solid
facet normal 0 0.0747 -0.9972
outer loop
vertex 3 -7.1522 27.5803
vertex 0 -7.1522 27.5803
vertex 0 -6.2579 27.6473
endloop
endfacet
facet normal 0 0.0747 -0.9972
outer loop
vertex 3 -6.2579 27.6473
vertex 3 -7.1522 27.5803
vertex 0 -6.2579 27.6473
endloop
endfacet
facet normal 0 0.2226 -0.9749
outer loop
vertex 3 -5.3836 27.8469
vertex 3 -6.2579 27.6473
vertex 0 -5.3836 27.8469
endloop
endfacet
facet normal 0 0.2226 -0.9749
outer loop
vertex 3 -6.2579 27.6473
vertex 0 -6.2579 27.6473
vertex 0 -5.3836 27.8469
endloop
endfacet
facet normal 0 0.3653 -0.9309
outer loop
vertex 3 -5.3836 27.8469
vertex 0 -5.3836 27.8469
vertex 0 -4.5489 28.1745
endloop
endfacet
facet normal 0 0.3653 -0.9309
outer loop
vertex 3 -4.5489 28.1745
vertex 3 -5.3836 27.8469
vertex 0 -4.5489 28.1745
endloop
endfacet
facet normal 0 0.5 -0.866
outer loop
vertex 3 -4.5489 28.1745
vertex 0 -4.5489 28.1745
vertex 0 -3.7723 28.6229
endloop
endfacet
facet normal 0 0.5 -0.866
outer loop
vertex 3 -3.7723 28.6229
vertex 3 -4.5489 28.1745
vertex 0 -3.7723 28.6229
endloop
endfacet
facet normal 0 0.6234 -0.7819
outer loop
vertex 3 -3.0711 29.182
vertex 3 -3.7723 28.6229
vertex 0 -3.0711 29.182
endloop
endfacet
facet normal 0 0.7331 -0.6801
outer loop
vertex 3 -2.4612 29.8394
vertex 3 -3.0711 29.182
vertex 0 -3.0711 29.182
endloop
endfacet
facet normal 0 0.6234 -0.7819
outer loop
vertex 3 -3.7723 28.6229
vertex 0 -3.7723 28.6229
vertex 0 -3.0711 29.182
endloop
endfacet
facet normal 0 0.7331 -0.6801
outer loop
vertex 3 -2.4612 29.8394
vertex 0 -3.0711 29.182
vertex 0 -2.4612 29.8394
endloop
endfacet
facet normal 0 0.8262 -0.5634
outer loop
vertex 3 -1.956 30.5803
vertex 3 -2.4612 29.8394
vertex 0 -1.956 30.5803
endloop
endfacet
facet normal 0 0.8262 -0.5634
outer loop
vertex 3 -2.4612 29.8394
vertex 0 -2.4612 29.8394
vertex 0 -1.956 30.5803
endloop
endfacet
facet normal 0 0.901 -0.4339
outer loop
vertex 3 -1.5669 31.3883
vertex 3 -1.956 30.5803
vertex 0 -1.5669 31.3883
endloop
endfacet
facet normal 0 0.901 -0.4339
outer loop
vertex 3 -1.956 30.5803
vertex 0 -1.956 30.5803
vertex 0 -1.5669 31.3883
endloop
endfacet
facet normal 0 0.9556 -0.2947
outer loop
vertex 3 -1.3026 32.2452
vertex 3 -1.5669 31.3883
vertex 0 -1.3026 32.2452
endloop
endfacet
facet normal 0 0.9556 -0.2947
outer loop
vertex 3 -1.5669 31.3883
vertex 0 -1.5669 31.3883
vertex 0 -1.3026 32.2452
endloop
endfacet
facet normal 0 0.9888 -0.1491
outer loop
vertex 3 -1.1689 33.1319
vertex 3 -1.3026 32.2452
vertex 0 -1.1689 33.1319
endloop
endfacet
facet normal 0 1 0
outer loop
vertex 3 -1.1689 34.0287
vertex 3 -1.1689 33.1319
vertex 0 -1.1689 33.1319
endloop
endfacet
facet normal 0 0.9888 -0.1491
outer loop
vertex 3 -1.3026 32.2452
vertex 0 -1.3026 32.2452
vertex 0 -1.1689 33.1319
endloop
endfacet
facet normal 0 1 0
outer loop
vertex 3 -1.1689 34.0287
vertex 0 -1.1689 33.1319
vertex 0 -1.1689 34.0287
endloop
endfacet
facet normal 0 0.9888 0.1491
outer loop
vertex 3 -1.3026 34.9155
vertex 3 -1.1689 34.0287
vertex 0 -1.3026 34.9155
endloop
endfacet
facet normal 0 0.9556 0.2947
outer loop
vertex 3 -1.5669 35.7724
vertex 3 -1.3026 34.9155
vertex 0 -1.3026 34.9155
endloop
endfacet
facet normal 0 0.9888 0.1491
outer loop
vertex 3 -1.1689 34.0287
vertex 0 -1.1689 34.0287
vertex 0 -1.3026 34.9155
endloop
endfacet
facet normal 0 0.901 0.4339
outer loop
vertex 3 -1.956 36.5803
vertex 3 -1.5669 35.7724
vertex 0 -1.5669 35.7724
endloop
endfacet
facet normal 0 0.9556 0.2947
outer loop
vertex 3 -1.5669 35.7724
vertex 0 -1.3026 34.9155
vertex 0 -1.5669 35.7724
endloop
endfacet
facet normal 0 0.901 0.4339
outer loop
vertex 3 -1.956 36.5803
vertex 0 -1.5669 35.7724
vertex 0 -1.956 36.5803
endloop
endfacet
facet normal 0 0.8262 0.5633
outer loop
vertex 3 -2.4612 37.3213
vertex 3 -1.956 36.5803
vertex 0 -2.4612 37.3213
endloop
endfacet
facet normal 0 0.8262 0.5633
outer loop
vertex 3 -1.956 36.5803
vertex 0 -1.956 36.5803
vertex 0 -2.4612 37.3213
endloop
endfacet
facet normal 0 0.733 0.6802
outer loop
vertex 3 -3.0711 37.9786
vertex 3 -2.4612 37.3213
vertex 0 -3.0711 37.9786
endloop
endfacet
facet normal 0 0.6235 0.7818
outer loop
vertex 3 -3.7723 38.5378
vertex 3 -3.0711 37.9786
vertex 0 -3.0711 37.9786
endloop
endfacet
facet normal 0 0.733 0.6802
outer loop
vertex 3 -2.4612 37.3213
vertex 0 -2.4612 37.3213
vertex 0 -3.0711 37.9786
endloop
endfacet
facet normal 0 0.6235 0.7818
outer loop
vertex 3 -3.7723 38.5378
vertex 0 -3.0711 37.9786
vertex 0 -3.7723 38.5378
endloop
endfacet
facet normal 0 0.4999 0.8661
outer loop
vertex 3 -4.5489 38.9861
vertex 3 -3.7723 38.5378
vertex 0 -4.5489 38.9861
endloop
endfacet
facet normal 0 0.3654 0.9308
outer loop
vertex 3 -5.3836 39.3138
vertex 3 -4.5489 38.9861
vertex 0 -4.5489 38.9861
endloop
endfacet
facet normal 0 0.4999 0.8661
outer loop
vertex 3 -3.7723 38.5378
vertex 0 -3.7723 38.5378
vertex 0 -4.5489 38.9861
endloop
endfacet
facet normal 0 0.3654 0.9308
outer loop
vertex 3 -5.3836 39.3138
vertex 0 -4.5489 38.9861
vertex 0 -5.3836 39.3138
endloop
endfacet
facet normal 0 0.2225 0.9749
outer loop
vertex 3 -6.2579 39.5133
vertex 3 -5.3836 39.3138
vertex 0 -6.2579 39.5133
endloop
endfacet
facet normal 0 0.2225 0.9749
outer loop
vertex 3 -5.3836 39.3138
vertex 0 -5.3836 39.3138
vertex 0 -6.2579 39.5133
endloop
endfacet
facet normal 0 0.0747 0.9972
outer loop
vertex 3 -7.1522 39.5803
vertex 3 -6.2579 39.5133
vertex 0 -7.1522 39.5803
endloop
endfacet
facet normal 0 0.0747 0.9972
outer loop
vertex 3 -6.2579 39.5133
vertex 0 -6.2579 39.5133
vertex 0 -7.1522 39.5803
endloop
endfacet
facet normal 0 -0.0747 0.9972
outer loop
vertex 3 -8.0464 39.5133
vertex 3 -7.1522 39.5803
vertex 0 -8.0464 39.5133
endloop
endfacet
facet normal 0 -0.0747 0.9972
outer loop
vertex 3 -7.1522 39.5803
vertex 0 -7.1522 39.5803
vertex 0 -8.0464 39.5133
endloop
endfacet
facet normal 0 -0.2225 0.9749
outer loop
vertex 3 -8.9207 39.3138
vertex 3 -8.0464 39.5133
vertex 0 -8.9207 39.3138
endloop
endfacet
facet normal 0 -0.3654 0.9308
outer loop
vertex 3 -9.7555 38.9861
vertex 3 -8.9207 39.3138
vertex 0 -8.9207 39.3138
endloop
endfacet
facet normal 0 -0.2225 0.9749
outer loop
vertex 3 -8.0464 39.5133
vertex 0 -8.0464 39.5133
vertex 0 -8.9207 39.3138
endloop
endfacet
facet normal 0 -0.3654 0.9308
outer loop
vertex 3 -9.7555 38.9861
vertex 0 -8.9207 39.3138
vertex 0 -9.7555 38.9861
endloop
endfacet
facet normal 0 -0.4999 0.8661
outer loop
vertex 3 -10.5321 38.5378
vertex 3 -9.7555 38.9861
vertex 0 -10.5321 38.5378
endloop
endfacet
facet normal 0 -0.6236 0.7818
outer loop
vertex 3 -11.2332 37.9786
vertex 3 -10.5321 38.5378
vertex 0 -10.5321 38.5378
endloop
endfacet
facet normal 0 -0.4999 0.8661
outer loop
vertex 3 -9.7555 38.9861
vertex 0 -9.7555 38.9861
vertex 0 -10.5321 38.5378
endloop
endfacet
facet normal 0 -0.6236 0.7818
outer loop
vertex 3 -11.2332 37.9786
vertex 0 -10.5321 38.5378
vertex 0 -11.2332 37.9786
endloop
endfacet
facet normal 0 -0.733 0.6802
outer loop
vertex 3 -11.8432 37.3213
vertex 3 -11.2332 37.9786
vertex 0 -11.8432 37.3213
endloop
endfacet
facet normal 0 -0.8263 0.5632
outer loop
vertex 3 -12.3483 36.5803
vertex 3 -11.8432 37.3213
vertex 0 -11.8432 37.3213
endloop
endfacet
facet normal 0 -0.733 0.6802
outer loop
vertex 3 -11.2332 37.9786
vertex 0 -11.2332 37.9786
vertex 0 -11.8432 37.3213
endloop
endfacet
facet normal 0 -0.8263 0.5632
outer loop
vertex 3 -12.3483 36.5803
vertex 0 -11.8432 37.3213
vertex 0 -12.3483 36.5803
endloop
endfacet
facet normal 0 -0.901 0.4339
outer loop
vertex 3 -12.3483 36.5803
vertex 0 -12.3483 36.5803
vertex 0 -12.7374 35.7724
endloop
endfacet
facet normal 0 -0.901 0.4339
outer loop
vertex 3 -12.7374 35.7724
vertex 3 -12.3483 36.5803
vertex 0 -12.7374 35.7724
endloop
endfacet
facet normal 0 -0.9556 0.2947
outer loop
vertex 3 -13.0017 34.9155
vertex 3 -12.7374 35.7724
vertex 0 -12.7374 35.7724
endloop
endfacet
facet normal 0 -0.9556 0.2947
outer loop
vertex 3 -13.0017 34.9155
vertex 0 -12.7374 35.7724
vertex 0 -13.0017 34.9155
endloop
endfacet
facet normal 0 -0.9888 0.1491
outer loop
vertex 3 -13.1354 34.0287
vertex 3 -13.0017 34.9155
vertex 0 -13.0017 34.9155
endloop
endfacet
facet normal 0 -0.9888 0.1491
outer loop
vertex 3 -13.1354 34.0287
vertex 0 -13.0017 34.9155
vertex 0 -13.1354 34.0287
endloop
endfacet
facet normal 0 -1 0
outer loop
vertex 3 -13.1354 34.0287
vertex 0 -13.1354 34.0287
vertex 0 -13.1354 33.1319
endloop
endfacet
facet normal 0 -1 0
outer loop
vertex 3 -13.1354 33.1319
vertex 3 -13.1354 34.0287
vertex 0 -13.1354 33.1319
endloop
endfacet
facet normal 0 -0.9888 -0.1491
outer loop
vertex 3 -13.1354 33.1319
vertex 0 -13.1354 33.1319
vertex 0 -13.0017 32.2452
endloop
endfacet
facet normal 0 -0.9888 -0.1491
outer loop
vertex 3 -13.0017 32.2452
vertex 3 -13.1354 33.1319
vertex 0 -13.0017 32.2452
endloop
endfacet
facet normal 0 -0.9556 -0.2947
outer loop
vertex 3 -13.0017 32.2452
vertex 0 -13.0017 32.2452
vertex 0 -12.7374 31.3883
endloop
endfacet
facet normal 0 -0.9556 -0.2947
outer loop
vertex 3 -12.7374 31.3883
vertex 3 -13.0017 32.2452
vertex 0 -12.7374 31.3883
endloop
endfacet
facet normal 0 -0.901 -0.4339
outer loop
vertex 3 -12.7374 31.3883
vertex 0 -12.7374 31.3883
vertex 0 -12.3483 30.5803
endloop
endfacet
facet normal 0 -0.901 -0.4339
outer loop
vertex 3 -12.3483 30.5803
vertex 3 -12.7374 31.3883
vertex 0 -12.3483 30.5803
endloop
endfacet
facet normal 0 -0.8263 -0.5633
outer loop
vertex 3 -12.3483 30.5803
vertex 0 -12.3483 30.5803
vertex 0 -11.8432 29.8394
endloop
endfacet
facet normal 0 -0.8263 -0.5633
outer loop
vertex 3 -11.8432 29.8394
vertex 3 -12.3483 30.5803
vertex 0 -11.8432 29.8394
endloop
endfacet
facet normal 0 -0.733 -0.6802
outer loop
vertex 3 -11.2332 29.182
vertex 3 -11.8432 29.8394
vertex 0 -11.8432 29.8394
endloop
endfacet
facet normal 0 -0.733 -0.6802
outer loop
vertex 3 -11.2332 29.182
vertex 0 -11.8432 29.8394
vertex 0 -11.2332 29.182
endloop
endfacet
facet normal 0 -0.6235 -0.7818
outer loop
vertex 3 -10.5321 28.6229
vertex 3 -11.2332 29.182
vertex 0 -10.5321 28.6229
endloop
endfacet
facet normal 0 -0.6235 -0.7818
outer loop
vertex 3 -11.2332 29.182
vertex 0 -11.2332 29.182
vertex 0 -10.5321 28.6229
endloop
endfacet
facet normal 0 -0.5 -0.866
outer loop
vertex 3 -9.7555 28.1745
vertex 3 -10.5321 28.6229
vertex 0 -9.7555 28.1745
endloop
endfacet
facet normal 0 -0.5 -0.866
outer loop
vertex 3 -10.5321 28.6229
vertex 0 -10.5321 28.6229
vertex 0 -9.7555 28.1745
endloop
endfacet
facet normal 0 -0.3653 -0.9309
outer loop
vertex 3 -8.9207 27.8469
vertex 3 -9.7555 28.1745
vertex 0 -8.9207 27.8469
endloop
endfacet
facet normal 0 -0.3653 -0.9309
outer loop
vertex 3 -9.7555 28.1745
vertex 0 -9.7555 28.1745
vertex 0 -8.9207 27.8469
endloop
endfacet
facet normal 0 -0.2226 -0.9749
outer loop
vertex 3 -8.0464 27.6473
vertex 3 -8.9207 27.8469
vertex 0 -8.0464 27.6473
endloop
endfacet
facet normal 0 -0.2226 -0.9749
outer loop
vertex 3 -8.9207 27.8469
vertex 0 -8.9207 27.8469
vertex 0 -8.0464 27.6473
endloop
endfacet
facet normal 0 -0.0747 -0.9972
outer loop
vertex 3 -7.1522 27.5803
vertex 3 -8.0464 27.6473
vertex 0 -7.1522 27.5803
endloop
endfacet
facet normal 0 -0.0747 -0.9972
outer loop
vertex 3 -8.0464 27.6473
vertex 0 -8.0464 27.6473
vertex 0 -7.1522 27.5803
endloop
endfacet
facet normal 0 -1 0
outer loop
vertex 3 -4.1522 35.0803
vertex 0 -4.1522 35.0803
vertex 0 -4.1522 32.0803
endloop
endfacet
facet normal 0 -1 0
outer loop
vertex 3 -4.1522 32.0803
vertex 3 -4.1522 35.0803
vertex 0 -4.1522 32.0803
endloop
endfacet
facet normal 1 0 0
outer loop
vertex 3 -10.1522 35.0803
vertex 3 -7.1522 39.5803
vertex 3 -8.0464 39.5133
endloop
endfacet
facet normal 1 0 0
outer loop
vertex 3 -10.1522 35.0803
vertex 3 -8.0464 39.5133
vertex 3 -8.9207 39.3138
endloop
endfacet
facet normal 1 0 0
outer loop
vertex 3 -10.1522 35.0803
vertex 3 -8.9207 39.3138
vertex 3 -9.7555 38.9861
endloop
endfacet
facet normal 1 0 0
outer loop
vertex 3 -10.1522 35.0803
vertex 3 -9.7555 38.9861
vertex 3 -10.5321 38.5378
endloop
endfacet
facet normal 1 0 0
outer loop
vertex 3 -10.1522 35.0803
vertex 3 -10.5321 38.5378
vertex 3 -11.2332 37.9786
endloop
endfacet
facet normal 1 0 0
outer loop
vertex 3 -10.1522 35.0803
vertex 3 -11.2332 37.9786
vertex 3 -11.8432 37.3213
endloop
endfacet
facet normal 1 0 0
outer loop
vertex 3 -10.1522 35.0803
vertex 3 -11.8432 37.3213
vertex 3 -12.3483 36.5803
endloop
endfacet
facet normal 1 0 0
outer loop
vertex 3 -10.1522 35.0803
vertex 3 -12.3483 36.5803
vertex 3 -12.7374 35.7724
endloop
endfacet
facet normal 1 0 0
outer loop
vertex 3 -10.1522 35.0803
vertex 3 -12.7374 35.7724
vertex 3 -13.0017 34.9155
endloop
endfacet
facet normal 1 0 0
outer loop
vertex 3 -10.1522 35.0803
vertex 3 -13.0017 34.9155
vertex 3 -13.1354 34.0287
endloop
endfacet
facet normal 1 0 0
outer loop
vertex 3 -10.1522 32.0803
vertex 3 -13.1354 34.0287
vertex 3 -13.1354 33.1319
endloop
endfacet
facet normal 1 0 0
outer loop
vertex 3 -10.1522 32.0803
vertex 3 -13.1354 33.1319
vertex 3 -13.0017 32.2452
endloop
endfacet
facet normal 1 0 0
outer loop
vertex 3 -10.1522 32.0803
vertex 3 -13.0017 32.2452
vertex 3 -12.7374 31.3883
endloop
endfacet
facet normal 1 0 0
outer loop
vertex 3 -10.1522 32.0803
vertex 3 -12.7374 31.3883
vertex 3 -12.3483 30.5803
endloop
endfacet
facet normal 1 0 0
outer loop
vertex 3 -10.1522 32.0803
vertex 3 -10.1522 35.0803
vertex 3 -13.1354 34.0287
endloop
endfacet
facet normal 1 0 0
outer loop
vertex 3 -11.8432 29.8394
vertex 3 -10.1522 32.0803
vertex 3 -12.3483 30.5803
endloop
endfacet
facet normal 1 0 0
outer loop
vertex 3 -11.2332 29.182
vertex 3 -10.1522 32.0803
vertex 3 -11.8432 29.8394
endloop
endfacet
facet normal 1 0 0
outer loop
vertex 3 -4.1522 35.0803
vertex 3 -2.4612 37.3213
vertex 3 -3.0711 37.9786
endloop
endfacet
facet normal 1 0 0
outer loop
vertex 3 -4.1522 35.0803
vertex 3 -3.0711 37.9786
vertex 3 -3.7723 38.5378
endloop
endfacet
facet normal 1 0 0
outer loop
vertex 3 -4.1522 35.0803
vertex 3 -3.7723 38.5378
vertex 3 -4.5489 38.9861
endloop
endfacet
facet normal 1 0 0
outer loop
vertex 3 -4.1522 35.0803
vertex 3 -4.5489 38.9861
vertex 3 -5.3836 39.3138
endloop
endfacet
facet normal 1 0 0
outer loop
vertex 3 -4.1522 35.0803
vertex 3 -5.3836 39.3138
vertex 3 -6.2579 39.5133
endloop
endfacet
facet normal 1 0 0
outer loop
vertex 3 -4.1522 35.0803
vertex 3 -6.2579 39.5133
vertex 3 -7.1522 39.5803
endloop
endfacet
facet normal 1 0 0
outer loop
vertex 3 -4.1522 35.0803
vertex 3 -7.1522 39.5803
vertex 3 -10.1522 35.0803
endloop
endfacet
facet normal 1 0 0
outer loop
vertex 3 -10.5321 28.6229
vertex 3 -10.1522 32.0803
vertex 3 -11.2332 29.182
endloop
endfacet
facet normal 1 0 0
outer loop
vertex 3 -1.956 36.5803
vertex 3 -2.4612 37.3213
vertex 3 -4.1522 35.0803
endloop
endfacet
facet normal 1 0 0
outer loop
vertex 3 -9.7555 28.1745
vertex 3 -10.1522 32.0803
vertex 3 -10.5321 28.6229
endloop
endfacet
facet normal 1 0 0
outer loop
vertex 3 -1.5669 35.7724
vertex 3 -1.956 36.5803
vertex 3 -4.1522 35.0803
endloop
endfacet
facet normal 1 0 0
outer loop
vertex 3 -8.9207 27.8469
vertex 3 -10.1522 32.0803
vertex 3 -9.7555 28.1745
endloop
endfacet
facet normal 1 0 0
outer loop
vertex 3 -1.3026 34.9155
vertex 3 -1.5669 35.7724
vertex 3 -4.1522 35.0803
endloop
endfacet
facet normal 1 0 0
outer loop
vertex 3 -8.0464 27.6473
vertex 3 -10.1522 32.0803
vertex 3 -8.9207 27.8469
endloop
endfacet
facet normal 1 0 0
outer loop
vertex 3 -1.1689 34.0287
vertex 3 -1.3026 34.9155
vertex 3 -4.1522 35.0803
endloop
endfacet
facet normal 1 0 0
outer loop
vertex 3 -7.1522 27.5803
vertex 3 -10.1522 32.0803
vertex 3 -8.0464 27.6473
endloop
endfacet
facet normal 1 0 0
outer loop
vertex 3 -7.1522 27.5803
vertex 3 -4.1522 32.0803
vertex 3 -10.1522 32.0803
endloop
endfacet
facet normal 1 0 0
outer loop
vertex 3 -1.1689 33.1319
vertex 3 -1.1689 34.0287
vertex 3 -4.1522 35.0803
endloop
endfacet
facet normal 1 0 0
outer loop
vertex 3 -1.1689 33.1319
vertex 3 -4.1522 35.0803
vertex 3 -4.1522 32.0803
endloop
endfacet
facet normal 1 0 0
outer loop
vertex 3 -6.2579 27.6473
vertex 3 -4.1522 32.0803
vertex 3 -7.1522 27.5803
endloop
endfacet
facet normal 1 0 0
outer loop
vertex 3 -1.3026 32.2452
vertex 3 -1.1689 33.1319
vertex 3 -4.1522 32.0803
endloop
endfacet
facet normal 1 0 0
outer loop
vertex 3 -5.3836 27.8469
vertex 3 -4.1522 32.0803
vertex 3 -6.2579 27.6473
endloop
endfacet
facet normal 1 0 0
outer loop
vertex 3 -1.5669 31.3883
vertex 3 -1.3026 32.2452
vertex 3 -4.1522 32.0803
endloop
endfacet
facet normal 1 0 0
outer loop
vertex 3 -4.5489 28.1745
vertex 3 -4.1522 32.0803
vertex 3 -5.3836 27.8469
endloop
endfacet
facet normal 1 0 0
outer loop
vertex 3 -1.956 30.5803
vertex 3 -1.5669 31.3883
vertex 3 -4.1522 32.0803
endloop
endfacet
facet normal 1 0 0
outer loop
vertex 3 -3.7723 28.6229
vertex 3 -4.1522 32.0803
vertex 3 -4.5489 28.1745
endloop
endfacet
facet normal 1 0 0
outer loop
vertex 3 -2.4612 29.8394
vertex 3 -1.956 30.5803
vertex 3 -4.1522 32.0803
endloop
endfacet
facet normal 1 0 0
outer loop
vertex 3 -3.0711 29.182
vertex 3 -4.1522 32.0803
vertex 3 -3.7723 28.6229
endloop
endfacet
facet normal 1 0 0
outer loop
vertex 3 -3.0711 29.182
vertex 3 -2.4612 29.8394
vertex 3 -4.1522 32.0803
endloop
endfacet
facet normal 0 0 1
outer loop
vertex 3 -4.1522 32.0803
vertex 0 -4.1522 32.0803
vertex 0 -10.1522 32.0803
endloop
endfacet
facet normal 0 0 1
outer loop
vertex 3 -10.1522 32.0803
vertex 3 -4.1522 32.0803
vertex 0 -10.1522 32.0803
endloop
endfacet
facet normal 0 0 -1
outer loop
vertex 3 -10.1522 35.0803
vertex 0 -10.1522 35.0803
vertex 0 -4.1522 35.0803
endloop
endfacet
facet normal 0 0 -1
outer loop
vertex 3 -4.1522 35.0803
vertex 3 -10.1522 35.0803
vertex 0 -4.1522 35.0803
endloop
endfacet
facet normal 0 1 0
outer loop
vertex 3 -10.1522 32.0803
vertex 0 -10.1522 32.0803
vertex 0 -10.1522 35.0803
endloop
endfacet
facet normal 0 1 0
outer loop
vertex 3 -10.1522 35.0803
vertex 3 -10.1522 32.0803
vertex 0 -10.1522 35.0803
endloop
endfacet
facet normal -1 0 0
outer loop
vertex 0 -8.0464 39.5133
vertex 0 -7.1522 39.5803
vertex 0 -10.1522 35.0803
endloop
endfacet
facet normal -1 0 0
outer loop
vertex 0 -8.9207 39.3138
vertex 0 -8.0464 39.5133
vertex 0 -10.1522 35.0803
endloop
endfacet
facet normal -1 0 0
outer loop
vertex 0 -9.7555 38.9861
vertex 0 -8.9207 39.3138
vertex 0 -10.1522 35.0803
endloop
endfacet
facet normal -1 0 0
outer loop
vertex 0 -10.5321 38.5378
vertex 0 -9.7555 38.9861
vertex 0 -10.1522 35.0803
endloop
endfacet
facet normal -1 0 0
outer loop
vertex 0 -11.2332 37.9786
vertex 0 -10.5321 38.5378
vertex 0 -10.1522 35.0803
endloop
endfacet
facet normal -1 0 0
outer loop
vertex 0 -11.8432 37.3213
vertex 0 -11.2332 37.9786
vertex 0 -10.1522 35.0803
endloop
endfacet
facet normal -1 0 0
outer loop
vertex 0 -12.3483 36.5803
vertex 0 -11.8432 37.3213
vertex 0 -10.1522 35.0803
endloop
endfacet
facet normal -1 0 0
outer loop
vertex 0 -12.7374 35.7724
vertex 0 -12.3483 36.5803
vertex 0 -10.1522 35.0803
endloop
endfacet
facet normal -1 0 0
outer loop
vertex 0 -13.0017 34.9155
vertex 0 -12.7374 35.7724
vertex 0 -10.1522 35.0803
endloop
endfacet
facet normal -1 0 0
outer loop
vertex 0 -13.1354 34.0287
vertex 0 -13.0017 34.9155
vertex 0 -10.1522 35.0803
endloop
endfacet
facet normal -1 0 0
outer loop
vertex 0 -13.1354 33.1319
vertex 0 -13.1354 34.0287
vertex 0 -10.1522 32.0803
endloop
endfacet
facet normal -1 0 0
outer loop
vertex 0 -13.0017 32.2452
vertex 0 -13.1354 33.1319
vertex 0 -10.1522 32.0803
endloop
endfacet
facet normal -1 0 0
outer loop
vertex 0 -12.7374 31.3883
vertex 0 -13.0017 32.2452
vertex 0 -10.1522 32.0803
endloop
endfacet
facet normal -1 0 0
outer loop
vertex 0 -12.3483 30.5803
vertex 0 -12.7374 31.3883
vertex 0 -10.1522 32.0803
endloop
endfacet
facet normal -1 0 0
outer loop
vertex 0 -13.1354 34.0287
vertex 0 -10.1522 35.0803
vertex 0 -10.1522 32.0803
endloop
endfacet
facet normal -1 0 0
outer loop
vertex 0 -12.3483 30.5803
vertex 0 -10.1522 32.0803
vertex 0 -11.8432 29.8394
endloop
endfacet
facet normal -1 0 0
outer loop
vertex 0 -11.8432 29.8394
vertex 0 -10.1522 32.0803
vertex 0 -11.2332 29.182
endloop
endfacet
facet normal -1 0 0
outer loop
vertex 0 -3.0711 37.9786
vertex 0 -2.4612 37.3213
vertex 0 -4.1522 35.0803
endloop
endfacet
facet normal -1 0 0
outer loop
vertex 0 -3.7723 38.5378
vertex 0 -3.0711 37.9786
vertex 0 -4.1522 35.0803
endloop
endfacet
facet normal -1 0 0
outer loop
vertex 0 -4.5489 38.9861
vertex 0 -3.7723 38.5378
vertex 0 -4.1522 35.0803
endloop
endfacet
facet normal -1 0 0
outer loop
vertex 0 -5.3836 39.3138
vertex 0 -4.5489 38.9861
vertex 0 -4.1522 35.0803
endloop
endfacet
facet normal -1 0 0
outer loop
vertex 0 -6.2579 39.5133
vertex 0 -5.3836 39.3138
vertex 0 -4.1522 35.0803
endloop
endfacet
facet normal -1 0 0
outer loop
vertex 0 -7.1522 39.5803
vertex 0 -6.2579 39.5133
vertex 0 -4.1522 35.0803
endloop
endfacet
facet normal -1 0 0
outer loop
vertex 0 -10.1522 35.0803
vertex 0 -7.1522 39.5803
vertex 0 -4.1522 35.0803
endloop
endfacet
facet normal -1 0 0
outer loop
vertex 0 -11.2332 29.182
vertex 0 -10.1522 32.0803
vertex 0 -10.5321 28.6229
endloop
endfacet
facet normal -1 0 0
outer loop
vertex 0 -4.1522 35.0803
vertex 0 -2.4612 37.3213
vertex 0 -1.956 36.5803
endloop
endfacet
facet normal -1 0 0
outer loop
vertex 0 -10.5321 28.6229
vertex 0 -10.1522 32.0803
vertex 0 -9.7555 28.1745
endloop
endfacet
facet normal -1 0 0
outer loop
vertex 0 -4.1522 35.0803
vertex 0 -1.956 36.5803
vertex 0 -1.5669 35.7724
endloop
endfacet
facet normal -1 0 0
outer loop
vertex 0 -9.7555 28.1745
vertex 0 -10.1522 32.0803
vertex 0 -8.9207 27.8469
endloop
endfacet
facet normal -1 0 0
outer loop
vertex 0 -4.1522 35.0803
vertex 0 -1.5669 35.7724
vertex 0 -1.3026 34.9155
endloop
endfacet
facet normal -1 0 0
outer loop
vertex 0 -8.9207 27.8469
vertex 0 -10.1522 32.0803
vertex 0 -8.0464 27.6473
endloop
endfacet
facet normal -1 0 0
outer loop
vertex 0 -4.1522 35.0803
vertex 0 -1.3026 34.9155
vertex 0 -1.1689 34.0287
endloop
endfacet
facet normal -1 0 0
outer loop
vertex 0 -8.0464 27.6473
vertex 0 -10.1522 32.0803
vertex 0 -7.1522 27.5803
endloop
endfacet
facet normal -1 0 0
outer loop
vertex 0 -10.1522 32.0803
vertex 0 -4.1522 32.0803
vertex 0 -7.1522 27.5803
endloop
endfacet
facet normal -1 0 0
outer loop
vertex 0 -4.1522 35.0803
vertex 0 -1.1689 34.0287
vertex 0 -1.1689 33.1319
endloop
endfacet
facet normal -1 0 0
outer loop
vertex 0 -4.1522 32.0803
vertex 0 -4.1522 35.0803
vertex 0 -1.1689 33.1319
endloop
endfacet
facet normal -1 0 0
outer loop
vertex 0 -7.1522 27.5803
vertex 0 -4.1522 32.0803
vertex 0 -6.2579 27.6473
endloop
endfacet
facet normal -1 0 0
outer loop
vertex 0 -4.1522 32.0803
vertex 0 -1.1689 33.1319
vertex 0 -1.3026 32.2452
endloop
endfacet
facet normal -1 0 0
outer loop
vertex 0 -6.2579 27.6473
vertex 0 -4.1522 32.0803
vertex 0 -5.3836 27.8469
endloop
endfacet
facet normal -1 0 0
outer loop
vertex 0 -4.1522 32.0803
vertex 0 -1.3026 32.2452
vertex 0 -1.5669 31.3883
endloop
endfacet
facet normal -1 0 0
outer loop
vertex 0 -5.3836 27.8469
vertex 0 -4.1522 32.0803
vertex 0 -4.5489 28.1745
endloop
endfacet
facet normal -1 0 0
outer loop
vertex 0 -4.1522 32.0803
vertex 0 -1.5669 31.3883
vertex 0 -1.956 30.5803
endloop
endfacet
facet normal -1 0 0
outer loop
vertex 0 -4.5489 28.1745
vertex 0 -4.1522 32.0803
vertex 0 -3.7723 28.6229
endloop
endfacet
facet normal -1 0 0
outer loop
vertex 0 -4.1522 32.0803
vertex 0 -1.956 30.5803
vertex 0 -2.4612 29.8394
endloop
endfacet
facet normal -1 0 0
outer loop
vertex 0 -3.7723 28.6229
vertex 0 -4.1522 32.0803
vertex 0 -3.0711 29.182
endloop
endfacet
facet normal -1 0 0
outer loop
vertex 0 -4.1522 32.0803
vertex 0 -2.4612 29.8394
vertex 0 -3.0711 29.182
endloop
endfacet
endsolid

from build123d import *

# Parameters (mm, degrees)
SKETCH1_R           = 6
SKETCH1_R_2         = 3.354101966
BOSS_EXTRUDE1_DEPTH = 3


with BuildPart() as part:
    # Sketch1 → Boss-Extrude1 (new body)
    with BuildSketch(Plane(origin=(0, 0, 0), x_dir=(0, 0, -1), z_dir=(1, 0, 0))):
        with Locations((-33.580329287, -7.15217083)):
            Circle(SKETCH1_R)
        with Locations((-33.580329287, -7.15217083)):
            Circle(SKETCH1_R_2, mode=Mode.SUBTRACT)
        with BuildLine():
            Line((-35.080329287, -4.15217083), (-32.080329287, -4.15217083))
            ThreePointArc((-32.080329287, -4.15217083), (-33.580329287, -3.798068864), (-35.080329287, -4.15217083))
        make_face()
        with BuildLine():
            ThreePointArc((-35.080329287, -4.15217083), (-36.934431253, -7.15217083), (-35.080329287, -10.15217083))
            Line((-35.080329287, -10.15217083), (-35.080329287, -4.15217083))
        make_face()
        with BuildLine():
            Line((-32.080329287, -4.15217083), (-32.080329287, -10.15217083))
            ThreePointArc((-32.080329287, -10.15217083), (-30.727159738, -8.915526587), (-30.22622732, -7.15217083))
            ThreePointArc((-30.22622732, -7.15217083), (-30.727159738, -5.388815073), (-32.080329287, -4.15217083))
        make_face()
        with BuildLine():
            ThreePointArc((-35.080329287, -10.15217083), (-33.580329287, -10.506272796), (-32.080329287, -10.15217083))
            Line((-32.080329287, -10.15217083), (-35.080329287, -10.15217083))
        make_face()
    extrude(amount=BOSS_EXTRUDE1_DEPTH)


solid = part.part
